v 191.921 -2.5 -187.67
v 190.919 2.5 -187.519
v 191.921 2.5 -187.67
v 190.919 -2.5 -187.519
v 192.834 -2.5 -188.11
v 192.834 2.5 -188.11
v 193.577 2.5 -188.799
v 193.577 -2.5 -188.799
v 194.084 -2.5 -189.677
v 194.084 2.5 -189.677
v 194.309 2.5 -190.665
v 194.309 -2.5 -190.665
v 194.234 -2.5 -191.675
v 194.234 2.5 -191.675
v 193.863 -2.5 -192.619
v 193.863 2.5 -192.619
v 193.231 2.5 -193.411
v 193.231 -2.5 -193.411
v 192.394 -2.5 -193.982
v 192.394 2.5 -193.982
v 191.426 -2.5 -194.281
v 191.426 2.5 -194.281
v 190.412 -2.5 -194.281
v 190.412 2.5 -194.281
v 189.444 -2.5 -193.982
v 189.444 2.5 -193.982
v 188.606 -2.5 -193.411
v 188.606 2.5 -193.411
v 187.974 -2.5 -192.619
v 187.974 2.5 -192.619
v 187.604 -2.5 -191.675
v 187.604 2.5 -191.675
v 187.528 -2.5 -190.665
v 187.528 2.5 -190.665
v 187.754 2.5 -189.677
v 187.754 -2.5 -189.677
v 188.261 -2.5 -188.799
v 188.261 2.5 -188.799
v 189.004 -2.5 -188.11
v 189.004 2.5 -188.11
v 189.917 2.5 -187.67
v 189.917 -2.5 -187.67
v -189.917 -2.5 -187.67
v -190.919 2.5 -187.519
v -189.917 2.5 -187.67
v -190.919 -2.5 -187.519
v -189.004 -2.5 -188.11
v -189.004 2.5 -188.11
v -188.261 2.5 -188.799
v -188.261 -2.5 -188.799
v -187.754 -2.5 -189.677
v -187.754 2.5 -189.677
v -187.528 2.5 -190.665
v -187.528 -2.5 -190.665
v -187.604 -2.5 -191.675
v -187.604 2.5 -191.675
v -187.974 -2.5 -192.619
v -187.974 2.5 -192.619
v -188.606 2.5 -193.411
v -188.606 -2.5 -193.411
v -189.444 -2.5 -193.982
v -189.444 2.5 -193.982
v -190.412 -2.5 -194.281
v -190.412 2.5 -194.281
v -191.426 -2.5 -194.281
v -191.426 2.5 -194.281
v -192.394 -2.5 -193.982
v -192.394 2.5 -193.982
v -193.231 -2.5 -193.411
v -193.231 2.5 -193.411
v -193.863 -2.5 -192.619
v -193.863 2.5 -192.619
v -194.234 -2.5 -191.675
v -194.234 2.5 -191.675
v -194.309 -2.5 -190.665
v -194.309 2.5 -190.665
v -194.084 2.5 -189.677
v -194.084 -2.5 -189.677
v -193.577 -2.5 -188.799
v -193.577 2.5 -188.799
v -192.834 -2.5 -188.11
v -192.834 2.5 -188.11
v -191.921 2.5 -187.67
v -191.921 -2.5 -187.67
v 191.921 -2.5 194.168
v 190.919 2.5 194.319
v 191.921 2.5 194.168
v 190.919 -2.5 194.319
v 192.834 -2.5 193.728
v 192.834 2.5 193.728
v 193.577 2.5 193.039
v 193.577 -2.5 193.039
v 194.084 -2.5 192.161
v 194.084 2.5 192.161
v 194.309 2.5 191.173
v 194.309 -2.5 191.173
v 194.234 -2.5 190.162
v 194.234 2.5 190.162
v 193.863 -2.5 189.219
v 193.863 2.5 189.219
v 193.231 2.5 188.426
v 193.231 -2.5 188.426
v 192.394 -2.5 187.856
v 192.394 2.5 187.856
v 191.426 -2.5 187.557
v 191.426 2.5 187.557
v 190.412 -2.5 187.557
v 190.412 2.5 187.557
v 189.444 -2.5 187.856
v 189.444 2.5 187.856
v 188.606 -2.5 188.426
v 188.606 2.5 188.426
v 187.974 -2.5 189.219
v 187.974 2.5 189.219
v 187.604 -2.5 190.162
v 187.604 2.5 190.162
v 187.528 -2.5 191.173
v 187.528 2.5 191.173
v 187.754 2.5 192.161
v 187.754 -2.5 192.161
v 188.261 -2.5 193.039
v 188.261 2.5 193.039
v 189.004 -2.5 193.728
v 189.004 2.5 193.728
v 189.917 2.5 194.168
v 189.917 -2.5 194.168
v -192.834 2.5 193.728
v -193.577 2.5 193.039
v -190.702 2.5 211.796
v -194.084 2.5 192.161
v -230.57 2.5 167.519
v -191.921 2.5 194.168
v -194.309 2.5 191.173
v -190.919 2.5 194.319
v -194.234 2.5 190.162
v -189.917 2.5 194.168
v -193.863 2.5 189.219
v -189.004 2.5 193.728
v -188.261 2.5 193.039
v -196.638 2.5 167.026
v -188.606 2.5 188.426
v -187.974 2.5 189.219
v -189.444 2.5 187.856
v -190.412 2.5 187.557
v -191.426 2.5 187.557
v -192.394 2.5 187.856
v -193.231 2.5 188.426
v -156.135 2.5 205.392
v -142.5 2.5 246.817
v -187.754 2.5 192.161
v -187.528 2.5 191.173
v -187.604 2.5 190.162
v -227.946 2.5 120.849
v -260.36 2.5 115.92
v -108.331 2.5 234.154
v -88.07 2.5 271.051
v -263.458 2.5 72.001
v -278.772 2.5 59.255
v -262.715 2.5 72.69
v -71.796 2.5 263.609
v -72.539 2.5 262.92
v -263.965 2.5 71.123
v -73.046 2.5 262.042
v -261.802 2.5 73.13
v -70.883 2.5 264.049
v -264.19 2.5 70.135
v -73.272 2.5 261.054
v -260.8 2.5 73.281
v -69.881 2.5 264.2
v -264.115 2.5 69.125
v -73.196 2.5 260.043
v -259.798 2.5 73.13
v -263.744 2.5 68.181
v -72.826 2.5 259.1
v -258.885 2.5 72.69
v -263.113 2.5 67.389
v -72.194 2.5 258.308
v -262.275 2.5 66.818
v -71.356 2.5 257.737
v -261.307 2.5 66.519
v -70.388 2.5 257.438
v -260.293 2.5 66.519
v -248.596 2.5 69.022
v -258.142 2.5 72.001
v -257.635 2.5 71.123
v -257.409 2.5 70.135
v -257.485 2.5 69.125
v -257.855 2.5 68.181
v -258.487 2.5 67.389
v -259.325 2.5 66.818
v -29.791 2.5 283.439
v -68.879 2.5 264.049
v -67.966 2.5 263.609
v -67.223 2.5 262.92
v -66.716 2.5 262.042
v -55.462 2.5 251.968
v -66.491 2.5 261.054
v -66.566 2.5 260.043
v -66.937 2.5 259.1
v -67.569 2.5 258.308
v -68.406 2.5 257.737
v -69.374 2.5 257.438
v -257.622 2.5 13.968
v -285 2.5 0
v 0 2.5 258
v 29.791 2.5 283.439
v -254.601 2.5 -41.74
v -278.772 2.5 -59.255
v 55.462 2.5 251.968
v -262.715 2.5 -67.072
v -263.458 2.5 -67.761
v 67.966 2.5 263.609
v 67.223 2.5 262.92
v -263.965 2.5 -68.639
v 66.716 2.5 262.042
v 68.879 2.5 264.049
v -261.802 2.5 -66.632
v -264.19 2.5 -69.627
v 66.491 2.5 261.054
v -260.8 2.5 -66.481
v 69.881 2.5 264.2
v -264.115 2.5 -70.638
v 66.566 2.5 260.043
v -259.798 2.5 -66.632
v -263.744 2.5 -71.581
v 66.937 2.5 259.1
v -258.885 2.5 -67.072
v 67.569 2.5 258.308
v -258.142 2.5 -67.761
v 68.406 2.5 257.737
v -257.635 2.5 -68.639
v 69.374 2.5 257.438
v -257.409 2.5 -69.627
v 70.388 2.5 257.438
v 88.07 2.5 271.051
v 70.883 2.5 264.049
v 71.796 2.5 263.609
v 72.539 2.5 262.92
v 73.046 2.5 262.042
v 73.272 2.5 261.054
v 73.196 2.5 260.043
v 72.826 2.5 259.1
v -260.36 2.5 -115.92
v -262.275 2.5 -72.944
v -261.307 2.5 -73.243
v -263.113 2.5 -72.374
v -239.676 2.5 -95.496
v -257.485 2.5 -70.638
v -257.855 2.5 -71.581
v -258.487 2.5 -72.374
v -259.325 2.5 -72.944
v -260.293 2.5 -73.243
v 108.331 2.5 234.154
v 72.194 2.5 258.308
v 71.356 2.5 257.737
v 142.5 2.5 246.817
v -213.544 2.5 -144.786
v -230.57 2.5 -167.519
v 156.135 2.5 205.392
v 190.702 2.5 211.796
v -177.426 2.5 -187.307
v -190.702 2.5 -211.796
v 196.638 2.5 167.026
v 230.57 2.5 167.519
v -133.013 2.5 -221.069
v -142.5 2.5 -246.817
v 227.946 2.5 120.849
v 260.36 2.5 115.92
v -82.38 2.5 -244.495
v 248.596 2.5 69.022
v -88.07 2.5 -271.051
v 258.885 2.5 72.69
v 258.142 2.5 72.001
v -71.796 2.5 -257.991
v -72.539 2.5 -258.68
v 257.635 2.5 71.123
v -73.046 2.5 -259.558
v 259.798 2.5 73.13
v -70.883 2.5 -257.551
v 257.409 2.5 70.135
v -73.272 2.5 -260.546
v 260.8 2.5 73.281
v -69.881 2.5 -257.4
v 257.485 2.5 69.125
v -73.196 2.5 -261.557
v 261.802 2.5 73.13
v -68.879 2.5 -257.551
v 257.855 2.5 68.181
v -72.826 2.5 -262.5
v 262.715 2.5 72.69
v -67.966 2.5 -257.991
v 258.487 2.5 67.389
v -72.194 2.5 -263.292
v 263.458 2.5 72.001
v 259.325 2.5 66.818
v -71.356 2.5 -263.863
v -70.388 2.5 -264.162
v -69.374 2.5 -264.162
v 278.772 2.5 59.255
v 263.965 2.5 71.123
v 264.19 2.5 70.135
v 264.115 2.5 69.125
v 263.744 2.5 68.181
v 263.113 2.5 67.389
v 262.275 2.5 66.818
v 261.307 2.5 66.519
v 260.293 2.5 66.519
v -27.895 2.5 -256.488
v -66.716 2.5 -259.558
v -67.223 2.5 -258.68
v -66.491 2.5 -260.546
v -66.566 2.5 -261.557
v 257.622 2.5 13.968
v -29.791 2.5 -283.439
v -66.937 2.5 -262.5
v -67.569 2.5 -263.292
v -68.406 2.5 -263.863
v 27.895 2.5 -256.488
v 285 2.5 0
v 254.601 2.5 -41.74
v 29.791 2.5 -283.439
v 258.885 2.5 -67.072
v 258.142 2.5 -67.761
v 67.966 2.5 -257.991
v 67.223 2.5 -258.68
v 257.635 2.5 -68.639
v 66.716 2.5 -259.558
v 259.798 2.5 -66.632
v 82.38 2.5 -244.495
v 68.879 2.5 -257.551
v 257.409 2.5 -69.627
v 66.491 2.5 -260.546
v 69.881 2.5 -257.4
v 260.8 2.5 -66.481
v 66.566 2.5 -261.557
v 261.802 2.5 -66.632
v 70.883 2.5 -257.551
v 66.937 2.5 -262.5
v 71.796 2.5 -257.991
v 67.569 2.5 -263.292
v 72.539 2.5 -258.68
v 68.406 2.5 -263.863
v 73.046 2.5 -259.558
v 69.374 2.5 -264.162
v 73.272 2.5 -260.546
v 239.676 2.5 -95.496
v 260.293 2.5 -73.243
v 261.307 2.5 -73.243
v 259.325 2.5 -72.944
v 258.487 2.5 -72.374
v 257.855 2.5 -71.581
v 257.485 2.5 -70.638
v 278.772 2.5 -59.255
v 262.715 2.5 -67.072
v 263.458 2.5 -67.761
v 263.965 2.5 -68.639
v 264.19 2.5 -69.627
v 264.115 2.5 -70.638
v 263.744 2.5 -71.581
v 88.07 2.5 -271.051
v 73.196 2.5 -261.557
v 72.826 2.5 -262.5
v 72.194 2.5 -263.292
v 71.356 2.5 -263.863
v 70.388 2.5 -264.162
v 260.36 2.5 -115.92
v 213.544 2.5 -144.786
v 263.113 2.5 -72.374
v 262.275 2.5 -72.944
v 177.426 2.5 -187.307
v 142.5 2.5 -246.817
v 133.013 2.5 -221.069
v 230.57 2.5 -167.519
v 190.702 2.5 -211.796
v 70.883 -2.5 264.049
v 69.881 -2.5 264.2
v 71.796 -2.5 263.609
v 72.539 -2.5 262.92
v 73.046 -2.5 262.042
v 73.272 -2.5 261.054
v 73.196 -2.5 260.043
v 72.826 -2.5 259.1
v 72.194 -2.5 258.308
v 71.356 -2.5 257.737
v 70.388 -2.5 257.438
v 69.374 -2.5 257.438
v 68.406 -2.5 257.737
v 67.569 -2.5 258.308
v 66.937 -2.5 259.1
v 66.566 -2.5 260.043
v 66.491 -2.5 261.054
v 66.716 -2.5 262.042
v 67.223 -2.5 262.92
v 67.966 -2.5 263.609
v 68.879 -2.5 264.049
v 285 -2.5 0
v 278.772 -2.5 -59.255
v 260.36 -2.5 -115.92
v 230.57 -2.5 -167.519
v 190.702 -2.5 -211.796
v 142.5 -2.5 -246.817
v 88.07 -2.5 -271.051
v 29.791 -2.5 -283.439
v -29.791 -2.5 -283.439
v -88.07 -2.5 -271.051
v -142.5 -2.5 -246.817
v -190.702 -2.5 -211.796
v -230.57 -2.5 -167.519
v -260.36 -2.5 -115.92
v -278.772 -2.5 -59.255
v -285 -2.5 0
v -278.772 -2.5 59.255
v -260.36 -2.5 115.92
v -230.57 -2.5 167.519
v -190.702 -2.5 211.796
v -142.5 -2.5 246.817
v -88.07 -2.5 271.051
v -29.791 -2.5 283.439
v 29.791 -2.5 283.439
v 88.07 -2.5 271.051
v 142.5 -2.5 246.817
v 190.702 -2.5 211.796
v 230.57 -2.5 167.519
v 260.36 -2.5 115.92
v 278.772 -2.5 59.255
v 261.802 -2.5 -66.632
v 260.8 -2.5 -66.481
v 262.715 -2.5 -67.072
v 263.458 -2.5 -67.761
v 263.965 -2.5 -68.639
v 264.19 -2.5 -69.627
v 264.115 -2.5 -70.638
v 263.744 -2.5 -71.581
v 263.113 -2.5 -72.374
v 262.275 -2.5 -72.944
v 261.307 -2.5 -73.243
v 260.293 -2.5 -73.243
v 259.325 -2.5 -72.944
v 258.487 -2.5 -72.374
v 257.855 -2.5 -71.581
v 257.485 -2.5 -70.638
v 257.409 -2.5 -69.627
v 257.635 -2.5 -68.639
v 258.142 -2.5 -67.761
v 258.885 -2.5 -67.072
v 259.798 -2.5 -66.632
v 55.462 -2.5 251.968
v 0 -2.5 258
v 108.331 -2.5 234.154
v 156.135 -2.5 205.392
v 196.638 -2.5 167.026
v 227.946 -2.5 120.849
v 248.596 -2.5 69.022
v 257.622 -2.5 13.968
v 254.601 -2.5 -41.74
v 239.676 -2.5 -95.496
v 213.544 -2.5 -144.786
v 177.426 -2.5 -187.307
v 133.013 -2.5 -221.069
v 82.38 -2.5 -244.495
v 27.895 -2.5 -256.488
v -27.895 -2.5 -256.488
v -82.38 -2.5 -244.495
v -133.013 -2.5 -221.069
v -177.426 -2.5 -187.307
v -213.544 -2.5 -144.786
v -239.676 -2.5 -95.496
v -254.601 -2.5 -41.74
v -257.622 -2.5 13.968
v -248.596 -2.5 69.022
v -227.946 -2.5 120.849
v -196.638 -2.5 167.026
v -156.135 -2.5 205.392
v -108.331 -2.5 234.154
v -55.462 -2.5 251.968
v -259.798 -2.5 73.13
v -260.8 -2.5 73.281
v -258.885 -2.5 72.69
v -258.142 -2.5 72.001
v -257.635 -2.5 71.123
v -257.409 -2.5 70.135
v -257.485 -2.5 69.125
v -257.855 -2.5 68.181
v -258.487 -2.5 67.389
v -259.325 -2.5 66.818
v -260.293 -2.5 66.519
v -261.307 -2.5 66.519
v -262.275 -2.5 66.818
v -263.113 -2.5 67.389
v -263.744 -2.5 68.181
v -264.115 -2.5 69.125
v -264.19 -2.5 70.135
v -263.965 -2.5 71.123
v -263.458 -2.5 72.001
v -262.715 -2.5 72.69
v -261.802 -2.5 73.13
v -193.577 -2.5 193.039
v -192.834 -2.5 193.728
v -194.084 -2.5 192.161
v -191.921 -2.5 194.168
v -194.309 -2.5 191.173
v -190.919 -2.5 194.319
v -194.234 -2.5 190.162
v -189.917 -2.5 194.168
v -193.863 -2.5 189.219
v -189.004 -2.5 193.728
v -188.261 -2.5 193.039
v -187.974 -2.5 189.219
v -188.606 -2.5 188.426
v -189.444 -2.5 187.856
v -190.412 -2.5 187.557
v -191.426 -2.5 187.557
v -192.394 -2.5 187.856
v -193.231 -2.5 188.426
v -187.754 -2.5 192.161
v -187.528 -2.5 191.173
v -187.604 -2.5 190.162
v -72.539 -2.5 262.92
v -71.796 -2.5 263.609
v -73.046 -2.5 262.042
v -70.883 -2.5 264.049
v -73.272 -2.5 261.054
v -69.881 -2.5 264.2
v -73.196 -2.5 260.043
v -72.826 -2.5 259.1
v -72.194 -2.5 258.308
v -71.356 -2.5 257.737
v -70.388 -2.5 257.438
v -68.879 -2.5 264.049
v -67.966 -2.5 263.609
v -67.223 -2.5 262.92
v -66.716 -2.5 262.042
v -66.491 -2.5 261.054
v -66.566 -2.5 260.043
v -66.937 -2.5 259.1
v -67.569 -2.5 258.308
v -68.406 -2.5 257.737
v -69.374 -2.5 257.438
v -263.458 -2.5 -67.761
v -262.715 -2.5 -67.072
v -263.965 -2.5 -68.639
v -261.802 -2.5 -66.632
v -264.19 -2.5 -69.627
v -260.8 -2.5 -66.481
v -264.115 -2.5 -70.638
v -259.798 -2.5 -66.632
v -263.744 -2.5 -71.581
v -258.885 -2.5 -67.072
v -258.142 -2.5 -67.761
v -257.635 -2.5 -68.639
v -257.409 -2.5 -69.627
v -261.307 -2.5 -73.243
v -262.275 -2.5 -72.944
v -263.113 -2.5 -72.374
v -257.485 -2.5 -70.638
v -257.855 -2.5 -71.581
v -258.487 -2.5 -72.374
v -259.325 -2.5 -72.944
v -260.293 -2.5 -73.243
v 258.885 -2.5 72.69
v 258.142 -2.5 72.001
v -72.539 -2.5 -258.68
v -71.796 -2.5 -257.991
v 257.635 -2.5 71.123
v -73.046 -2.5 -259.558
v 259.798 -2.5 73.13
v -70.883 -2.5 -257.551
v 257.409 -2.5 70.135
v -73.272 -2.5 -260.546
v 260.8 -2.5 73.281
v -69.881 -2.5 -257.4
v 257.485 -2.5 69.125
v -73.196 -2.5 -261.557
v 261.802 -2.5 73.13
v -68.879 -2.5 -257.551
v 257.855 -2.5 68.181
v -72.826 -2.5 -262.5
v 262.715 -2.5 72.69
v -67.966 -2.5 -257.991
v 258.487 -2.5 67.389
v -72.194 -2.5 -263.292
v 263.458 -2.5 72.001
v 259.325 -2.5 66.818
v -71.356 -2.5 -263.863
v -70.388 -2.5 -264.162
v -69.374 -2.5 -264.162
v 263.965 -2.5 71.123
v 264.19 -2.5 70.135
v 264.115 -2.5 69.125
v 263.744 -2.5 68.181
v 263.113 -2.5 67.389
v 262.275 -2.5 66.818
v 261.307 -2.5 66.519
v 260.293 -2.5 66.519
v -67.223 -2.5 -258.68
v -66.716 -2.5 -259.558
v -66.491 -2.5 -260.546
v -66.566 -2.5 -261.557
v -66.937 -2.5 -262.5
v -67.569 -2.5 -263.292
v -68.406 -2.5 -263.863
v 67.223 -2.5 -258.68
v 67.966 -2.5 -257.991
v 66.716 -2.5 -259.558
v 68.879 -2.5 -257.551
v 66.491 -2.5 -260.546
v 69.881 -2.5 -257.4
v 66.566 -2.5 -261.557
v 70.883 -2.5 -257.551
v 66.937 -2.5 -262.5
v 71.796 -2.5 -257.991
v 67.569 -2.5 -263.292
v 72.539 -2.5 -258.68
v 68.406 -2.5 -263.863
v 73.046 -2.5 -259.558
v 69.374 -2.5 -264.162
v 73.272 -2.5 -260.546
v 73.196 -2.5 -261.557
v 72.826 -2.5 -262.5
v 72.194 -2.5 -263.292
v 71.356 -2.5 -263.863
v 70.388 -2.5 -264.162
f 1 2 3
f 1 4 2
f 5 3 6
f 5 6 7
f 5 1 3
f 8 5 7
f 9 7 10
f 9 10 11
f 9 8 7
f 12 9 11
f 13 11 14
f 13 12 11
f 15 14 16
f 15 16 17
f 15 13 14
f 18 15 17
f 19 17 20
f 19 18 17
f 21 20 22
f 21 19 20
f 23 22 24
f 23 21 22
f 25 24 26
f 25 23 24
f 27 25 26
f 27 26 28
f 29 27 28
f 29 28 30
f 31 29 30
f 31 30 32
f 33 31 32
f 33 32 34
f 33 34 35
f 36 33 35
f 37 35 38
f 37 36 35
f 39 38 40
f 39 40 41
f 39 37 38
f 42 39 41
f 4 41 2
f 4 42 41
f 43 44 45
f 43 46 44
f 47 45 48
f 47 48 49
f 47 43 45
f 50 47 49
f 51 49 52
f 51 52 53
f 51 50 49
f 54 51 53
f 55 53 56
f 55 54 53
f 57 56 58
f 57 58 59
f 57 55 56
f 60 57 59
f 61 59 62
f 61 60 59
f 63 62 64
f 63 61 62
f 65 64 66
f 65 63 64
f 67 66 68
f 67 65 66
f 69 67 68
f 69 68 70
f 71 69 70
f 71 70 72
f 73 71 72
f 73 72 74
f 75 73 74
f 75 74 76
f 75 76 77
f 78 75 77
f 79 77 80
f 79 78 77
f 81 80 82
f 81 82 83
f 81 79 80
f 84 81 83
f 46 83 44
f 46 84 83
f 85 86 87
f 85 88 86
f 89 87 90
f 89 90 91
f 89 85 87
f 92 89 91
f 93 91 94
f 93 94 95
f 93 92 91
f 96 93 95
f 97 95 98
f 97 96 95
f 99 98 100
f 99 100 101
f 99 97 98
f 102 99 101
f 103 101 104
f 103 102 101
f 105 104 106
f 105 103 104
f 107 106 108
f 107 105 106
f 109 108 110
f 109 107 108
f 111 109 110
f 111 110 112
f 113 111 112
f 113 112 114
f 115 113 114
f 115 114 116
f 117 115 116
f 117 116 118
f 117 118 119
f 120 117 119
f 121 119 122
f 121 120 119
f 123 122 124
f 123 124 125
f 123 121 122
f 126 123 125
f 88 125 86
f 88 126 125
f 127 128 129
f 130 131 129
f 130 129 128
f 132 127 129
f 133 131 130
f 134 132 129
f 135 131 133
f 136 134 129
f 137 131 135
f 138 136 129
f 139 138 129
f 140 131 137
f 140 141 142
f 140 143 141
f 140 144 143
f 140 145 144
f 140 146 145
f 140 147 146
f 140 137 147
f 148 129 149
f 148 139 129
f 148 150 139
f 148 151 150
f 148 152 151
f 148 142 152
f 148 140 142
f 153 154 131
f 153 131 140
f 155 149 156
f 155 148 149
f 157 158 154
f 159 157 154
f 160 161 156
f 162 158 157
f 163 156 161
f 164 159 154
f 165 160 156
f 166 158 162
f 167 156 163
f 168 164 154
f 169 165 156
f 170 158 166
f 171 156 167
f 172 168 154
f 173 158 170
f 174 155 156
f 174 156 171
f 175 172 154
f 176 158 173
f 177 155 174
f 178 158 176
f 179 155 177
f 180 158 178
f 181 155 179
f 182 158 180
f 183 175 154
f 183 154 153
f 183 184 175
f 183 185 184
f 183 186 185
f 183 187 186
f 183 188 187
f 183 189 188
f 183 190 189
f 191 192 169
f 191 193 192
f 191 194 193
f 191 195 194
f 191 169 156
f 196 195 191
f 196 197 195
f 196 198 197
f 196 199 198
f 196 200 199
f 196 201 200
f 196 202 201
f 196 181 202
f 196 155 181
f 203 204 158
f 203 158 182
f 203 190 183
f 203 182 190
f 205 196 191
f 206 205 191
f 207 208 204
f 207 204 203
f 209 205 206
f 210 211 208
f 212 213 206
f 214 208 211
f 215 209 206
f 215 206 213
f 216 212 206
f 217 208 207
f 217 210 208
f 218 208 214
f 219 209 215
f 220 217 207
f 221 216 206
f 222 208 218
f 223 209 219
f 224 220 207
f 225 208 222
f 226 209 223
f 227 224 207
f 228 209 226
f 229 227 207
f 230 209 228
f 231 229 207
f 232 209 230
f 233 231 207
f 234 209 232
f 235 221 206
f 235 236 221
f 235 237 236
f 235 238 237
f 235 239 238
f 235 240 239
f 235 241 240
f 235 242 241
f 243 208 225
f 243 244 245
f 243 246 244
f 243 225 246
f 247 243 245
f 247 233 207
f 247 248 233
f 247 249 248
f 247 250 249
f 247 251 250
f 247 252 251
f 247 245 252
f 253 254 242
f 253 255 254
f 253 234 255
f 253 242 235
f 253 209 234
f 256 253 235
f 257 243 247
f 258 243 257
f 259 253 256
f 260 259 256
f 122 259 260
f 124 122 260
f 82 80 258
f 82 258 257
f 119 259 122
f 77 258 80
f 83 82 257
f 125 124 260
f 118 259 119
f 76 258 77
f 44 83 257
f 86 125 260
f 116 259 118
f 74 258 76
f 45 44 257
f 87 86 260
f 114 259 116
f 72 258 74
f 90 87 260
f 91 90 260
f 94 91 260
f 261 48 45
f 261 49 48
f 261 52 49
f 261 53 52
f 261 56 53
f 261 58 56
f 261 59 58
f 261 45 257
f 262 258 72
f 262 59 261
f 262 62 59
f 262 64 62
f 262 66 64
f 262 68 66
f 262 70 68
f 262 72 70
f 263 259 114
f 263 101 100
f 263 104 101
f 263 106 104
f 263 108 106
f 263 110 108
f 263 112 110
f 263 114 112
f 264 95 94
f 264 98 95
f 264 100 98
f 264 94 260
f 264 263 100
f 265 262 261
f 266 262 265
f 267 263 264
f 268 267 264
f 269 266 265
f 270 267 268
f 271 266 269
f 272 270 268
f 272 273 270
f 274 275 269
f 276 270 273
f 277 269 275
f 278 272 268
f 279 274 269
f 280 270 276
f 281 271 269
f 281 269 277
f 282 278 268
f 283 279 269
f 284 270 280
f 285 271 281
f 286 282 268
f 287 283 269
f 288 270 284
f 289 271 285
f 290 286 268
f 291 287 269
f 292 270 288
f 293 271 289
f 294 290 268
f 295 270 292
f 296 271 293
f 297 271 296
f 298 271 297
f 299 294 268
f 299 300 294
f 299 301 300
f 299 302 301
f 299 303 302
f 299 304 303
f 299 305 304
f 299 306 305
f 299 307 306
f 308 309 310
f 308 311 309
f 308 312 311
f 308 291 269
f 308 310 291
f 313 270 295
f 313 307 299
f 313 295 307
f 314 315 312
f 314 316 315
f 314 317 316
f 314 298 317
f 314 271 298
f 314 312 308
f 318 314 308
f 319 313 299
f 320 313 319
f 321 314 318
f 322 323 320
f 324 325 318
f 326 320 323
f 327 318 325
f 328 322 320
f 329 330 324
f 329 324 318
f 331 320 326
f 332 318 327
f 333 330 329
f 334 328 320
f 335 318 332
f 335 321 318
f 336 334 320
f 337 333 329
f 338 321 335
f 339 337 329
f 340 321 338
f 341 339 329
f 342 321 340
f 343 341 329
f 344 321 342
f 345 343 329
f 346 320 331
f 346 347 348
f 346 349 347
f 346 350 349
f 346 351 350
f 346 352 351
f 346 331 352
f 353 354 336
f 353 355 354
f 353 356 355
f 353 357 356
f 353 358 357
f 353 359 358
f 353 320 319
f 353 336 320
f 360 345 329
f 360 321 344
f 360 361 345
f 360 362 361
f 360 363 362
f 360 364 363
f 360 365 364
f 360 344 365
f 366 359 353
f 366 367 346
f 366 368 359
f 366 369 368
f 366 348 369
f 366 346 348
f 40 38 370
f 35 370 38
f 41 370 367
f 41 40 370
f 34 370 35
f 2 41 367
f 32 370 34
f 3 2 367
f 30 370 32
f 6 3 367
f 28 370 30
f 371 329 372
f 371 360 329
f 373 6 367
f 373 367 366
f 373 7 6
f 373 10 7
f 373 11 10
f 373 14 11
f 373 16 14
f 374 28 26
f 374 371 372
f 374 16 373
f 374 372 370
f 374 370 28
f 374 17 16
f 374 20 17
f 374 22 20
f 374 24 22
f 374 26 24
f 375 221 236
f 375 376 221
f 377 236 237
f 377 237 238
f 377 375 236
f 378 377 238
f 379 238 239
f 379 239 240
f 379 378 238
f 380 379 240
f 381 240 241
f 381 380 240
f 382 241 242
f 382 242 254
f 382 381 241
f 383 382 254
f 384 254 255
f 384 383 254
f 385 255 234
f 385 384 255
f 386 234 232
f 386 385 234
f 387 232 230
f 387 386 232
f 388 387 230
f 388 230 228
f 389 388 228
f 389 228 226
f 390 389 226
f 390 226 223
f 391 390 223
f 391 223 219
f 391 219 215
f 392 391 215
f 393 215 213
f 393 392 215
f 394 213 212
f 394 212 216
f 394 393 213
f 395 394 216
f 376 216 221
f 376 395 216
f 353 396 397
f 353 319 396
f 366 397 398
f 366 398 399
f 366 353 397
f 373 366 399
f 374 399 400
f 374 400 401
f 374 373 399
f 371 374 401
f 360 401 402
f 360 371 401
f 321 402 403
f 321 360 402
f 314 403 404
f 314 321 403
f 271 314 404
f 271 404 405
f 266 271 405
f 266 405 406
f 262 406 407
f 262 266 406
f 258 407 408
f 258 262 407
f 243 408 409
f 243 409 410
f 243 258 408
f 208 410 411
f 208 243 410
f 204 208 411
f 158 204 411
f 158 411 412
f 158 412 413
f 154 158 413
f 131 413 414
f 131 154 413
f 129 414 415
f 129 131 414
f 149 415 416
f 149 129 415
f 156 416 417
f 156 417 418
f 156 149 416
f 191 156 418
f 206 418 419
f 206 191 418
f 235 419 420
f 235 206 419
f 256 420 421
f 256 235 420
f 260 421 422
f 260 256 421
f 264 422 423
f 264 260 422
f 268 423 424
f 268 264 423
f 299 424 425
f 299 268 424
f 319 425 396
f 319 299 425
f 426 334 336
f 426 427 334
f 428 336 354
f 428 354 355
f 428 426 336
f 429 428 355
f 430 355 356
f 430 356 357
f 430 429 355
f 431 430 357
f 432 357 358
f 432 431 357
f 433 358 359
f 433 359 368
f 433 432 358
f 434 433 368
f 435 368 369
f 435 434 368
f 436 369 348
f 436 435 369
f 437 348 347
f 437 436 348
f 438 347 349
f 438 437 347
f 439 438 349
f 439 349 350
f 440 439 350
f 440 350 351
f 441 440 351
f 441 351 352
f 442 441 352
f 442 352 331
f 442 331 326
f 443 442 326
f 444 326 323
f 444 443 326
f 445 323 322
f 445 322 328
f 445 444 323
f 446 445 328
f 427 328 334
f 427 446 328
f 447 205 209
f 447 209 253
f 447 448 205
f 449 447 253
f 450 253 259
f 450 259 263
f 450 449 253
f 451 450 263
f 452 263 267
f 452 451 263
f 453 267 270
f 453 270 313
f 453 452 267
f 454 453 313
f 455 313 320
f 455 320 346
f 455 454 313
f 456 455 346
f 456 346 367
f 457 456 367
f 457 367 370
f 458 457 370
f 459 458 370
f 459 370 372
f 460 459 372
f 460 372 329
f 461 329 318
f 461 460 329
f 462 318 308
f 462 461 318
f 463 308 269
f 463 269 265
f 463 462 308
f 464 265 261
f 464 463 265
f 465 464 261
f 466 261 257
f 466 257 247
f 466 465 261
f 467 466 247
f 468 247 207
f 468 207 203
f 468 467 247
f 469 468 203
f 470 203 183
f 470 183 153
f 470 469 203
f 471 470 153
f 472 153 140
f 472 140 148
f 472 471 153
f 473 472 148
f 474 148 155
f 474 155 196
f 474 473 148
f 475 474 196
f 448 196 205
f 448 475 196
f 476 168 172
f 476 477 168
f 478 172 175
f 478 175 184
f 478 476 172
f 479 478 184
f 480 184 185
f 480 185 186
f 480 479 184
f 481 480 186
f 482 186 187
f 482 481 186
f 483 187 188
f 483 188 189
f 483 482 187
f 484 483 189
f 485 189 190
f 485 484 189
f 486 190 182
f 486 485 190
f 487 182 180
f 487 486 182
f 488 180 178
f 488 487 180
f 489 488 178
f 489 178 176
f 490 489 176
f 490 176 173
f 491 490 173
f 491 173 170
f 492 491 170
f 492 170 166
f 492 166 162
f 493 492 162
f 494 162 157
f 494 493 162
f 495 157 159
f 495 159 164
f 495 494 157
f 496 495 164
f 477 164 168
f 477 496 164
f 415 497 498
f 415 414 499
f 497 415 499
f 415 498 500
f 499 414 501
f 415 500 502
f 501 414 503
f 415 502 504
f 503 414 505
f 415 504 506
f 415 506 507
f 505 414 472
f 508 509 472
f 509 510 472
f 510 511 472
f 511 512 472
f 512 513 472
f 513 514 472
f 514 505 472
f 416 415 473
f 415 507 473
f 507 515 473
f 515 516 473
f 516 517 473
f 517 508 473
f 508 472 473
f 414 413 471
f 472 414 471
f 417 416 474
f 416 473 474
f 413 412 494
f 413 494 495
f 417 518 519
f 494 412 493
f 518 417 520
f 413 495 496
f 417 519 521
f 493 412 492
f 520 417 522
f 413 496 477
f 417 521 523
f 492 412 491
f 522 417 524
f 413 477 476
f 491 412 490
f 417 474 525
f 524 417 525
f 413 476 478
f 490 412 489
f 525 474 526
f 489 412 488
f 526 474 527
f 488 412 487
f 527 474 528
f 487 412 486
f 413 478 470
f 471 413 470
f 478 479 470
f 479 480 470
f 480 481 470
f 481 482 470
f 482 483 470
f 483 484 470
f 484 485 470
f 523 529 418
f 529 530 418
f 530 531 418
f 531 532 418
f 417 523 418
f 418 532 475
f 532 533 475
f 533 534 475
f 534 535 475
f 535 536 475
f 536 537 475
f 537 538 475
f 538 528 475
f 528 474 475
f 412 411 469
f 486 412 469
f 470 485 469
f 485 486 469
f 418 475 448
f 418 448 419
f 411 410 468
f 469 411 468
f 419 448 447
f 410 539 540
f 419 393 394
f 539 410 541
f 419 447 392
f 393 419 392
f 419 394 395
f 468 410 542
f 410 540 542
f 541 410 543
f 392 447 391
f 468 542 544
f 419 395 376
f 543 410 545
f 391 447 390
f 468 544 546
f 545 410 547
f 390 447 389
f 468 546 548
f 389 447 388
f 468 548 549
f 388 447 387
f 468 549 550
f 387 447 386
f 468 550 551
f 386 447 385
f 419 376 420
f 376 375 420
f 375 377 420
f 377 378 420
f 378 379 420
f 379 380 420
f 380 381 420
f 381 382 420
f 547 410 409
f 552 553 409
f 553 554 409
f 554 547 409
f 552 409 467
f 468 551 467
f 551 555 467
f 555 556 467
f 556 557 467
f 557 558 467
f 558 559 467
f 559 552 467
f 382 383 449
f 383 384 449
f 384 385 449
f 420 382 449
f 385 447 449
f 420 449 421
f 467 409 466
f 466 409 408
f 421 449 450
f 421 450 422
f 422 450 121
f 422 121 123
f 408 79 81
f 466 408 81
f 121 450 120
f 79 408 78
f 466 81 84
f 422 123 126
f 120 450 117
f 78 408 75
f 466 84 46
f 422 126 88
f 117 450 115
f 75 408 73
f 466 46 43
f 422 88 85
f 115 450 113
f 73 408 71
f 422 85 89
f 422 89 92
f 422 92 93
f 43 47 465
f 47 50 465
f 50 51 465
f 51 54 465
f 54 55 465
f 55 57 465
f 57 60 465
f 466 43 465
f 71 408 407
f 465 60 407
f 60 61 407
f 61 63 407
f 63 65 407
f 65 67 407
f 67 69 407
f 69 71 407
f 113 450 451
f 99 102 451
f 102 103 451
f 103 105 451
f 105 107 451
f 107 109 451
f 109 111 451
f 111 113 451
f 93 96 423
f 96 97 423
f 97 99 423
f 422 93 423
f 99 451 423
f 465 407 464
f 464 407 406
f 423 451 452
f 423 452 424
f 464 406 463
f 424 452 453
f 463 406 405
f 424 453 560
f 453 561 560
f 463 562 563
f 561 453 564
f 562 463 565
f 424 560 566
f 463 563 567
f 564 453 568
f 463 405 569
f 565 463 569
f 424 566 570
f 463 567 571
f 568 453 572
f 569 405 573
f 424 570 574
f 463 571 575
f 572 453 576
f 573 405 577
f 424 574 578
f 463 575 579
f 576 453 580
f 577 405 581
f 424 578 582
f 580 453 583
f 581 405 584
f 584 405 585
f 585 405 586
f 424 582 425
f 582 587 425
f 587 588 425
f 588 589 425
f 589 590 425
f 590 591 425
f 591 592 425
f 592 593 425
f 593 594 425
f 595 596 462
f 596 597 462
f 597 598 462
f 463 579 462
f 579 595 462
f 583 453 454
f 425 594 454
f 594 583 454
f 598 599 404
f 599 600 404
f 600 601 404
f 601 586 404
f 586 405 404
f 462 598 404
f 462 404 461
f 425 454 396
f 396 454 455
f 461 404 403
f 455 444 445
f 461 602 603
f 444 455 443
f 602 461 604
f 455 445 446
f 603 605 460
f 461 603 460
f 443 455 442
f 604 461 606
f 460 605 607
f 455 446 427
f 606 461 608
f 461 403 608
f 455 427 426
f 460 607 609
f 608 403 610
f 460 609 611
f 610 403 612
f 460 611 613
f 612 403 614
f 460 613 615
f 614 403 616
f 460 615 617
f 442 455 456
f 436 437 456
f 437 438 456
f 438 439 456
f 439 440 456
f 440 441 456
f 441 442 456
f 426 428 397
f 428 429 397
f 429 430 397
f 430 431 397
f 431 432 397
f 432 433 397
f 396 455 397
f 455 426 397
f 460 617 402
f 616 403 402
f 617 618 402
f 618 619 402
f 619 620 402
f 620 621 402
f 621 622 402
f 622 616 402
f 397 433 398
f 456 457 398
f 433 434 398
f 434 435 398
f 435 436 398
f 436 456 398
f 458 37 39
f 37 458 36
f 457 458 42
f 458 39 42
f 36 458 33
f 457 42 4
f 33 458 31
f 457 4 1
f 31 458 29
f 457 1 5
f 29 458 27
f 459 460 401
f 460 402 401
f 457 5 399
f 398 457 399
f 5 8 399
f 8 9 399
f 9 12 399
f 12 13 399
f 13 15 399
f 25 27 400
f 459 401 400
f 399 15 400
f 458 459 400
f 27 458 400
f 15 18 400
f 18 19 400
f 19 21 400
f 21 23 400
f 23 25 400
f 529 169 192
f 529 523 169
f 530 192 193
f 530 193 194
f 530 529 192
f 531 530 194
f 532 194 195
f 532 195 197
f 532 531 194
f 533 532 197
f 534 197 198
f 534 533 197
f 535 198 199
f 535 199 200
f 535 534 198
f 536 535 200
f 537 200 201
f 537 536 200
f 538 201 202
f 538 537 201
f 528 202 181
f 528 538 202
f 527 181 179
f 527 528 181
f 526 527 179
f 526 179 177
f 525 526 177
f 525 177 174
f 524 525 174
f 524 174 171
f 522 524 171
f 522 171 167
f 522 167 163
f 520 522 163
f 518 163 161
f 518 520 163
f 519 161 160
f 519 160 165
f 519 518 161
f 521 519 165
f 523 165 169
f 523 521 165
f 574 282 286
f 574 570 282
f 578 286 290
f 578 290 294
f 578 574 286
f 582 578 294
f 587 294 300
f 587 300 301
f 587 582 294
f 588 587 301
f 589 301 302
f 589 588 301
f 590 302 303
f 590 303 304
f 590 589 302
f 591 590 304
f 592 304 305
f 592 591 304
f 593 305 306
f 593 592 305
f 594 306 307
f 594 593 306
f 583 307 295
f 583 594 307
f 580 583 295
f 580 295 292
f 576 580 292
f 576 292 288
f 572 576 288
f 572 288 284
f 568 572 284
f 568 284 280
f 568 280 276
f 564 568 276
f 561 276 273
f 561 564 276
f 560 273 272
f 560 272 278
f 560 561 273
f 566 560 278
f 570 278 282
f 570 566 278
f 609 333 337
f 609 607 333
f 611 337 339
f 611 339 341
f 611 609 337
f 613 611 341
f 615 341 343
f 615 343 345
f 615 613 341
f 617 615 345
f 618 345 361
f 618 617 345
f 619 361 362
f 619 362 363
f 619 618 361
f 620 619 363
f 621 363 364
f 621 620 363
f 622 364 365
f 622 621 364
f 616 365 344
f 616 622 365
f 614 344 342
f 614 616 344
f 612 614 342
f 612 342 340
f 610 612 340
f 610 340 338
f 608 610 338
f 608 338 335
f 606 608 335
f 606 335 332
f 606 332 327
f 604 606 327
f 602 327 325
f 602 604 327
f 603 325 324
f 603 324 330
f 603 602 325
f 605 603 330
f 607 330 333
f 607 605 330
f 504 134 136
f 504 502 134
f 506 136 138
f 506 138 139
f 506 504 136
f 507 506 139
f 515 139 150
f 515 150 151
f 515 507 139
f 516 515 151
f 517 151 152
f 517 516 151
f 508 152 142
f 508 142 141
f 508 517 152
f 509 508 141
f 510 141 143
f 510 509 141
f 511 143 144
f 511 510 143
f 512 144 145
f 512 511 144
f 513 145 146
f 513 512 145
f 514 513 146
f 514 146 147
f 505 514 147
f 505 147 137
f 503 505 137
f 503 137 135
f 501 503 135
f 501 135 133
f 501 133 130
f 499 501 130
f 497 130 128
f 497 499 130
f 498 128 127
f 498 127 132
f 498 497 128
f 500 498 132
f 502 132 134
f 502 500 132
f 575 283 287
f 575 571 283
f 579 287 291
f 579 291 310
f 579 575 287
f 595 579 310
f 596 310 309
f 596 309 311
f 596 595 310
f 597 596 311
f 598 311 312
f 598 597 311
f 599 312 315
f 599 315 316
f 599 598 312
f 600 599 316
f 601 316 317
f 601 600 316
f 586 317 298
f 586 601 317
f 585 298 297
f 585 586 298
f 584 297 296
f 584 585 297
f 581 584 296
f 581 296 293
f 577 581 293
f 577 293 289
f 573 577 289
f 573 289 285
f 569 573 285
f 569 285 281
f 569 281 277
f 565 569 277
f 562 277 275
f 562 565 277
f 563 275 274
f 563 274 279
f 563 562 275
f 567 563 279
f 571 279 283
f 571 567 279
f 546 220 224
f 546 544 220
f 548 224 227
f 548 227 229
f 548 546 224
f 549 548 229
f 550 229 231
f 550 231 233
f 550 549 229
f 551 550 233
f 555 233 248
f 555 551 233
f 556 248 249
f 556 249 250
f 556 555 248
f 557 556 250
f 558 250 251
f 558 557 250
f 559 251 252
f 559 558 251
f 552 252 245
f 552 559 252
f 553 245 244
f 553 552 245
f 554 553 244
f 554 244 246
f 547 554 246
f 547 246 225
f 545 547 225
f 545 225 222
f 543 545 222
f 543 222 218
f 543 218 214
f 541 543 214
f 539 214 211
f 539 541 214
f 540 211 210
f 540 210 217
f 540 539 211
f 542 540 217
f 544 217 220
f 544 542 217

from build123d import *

# Parameters (mm, degrees)
SCHIZZO1_R                   = 258
SCHIZZO1_R_2                 = 3.4
ESTRUSIONE_ESTRUSIONE1_DEPTH = 2.5


with BuildPart() as part:
    # Schizzo1 → Estrusione-Estrusione1 (new, symmetric)
    with BuildSketch(Plane(origin=(0, 0, 0), x_dir=(1, 0, 0), z_dir=(0, 1, 0))):
        with BuildLine():
            ThreePointArc((-285, 0), (0, -285), (285, 0))
            ThreePointArc((285, 0), (0, 285), (-285, 0))
        make_face()
        with Locations(Location((0, 0, 0), (0, 0, 270))):
            Circle(SCHIZZO1_R, mode=Mode.SUBTRACT)
        with Locations(Location((-260.799973098, 69.881142178, 0), (0, 0, 270))):
            Circle(SCHIZZO1_R_2, mode=Mode.SUBTRACT)
        with Locations(Location((-190.91883092, 190.91883092, 0), (0, 0, 270))):
            Circle(SCHIZZO1_R_2, mode=Mode.SUBTRACT)
        with Locations(Location((-69.881142178, 260.799973098, 0), (0, 0, 270))):
            Circle(SCHIZZO1_R_2, mode=Mode.SUBTRACT)
        with Locations(Location((69.881142178, 260.799973098, 0), (0, 0, 270))):
            Circle(SCHIZZO1_R_2, mode=Mode.SUBTRACT)
        with Locations(Location((190.91883092, 190.91883092, 0), (0, 0, 270))):
            Circle(SCHIZZO1_R_2, mode=Mode.SUBTRACT)
        with Locations(Location((260.799973098, 69.881142178, 0), (0, 0, 270))):
            Circle(SCHIZZO1_R_2, mode=Mode.SUBTRACT)
        with Locations(Location((260.799973098, -69.881142178, 0), (0, 0, 270))):
            Circle(SCHIZZO1_R_2, mode=Mode.SUBTRACT)
        with Locations(Location((190.91883092, -190.91883092, 0), (0, 0, 270))):
            Circle(SCHIZZO1_R_2, mode=Mode.SUBTRACT)
        with Locations(Location((69.881142178, -260.799973098, 0), (0, 0, 270))):
            Circle(SCHIZZO1_R_2, mode=Mode.SUBTRACT)
        with Locations(Location((-69.881142178, -260.799973098, 0), (0, 0, 270))):
            Circle(SCHIZZO1_R_2, mode=Mode.SUBTRACT)
        with Locations(Location((-190.91883092, -190.91883092, 0), (0, 0, 270))):
            Circle(SCHIZZO1_R_2, mode=Mode.SUBTRACT)
        with Locations(Location((-260.799973098, -69.881142178, 0), (0, 0, 270))):
            Circle(SCHIZZO1_R_2, mode=Mode.SUBTRACT)
    extrude(amount=ESTRUSIONE_ESTRUSIONE1_DEPTH, both=True)


solid = part.part
